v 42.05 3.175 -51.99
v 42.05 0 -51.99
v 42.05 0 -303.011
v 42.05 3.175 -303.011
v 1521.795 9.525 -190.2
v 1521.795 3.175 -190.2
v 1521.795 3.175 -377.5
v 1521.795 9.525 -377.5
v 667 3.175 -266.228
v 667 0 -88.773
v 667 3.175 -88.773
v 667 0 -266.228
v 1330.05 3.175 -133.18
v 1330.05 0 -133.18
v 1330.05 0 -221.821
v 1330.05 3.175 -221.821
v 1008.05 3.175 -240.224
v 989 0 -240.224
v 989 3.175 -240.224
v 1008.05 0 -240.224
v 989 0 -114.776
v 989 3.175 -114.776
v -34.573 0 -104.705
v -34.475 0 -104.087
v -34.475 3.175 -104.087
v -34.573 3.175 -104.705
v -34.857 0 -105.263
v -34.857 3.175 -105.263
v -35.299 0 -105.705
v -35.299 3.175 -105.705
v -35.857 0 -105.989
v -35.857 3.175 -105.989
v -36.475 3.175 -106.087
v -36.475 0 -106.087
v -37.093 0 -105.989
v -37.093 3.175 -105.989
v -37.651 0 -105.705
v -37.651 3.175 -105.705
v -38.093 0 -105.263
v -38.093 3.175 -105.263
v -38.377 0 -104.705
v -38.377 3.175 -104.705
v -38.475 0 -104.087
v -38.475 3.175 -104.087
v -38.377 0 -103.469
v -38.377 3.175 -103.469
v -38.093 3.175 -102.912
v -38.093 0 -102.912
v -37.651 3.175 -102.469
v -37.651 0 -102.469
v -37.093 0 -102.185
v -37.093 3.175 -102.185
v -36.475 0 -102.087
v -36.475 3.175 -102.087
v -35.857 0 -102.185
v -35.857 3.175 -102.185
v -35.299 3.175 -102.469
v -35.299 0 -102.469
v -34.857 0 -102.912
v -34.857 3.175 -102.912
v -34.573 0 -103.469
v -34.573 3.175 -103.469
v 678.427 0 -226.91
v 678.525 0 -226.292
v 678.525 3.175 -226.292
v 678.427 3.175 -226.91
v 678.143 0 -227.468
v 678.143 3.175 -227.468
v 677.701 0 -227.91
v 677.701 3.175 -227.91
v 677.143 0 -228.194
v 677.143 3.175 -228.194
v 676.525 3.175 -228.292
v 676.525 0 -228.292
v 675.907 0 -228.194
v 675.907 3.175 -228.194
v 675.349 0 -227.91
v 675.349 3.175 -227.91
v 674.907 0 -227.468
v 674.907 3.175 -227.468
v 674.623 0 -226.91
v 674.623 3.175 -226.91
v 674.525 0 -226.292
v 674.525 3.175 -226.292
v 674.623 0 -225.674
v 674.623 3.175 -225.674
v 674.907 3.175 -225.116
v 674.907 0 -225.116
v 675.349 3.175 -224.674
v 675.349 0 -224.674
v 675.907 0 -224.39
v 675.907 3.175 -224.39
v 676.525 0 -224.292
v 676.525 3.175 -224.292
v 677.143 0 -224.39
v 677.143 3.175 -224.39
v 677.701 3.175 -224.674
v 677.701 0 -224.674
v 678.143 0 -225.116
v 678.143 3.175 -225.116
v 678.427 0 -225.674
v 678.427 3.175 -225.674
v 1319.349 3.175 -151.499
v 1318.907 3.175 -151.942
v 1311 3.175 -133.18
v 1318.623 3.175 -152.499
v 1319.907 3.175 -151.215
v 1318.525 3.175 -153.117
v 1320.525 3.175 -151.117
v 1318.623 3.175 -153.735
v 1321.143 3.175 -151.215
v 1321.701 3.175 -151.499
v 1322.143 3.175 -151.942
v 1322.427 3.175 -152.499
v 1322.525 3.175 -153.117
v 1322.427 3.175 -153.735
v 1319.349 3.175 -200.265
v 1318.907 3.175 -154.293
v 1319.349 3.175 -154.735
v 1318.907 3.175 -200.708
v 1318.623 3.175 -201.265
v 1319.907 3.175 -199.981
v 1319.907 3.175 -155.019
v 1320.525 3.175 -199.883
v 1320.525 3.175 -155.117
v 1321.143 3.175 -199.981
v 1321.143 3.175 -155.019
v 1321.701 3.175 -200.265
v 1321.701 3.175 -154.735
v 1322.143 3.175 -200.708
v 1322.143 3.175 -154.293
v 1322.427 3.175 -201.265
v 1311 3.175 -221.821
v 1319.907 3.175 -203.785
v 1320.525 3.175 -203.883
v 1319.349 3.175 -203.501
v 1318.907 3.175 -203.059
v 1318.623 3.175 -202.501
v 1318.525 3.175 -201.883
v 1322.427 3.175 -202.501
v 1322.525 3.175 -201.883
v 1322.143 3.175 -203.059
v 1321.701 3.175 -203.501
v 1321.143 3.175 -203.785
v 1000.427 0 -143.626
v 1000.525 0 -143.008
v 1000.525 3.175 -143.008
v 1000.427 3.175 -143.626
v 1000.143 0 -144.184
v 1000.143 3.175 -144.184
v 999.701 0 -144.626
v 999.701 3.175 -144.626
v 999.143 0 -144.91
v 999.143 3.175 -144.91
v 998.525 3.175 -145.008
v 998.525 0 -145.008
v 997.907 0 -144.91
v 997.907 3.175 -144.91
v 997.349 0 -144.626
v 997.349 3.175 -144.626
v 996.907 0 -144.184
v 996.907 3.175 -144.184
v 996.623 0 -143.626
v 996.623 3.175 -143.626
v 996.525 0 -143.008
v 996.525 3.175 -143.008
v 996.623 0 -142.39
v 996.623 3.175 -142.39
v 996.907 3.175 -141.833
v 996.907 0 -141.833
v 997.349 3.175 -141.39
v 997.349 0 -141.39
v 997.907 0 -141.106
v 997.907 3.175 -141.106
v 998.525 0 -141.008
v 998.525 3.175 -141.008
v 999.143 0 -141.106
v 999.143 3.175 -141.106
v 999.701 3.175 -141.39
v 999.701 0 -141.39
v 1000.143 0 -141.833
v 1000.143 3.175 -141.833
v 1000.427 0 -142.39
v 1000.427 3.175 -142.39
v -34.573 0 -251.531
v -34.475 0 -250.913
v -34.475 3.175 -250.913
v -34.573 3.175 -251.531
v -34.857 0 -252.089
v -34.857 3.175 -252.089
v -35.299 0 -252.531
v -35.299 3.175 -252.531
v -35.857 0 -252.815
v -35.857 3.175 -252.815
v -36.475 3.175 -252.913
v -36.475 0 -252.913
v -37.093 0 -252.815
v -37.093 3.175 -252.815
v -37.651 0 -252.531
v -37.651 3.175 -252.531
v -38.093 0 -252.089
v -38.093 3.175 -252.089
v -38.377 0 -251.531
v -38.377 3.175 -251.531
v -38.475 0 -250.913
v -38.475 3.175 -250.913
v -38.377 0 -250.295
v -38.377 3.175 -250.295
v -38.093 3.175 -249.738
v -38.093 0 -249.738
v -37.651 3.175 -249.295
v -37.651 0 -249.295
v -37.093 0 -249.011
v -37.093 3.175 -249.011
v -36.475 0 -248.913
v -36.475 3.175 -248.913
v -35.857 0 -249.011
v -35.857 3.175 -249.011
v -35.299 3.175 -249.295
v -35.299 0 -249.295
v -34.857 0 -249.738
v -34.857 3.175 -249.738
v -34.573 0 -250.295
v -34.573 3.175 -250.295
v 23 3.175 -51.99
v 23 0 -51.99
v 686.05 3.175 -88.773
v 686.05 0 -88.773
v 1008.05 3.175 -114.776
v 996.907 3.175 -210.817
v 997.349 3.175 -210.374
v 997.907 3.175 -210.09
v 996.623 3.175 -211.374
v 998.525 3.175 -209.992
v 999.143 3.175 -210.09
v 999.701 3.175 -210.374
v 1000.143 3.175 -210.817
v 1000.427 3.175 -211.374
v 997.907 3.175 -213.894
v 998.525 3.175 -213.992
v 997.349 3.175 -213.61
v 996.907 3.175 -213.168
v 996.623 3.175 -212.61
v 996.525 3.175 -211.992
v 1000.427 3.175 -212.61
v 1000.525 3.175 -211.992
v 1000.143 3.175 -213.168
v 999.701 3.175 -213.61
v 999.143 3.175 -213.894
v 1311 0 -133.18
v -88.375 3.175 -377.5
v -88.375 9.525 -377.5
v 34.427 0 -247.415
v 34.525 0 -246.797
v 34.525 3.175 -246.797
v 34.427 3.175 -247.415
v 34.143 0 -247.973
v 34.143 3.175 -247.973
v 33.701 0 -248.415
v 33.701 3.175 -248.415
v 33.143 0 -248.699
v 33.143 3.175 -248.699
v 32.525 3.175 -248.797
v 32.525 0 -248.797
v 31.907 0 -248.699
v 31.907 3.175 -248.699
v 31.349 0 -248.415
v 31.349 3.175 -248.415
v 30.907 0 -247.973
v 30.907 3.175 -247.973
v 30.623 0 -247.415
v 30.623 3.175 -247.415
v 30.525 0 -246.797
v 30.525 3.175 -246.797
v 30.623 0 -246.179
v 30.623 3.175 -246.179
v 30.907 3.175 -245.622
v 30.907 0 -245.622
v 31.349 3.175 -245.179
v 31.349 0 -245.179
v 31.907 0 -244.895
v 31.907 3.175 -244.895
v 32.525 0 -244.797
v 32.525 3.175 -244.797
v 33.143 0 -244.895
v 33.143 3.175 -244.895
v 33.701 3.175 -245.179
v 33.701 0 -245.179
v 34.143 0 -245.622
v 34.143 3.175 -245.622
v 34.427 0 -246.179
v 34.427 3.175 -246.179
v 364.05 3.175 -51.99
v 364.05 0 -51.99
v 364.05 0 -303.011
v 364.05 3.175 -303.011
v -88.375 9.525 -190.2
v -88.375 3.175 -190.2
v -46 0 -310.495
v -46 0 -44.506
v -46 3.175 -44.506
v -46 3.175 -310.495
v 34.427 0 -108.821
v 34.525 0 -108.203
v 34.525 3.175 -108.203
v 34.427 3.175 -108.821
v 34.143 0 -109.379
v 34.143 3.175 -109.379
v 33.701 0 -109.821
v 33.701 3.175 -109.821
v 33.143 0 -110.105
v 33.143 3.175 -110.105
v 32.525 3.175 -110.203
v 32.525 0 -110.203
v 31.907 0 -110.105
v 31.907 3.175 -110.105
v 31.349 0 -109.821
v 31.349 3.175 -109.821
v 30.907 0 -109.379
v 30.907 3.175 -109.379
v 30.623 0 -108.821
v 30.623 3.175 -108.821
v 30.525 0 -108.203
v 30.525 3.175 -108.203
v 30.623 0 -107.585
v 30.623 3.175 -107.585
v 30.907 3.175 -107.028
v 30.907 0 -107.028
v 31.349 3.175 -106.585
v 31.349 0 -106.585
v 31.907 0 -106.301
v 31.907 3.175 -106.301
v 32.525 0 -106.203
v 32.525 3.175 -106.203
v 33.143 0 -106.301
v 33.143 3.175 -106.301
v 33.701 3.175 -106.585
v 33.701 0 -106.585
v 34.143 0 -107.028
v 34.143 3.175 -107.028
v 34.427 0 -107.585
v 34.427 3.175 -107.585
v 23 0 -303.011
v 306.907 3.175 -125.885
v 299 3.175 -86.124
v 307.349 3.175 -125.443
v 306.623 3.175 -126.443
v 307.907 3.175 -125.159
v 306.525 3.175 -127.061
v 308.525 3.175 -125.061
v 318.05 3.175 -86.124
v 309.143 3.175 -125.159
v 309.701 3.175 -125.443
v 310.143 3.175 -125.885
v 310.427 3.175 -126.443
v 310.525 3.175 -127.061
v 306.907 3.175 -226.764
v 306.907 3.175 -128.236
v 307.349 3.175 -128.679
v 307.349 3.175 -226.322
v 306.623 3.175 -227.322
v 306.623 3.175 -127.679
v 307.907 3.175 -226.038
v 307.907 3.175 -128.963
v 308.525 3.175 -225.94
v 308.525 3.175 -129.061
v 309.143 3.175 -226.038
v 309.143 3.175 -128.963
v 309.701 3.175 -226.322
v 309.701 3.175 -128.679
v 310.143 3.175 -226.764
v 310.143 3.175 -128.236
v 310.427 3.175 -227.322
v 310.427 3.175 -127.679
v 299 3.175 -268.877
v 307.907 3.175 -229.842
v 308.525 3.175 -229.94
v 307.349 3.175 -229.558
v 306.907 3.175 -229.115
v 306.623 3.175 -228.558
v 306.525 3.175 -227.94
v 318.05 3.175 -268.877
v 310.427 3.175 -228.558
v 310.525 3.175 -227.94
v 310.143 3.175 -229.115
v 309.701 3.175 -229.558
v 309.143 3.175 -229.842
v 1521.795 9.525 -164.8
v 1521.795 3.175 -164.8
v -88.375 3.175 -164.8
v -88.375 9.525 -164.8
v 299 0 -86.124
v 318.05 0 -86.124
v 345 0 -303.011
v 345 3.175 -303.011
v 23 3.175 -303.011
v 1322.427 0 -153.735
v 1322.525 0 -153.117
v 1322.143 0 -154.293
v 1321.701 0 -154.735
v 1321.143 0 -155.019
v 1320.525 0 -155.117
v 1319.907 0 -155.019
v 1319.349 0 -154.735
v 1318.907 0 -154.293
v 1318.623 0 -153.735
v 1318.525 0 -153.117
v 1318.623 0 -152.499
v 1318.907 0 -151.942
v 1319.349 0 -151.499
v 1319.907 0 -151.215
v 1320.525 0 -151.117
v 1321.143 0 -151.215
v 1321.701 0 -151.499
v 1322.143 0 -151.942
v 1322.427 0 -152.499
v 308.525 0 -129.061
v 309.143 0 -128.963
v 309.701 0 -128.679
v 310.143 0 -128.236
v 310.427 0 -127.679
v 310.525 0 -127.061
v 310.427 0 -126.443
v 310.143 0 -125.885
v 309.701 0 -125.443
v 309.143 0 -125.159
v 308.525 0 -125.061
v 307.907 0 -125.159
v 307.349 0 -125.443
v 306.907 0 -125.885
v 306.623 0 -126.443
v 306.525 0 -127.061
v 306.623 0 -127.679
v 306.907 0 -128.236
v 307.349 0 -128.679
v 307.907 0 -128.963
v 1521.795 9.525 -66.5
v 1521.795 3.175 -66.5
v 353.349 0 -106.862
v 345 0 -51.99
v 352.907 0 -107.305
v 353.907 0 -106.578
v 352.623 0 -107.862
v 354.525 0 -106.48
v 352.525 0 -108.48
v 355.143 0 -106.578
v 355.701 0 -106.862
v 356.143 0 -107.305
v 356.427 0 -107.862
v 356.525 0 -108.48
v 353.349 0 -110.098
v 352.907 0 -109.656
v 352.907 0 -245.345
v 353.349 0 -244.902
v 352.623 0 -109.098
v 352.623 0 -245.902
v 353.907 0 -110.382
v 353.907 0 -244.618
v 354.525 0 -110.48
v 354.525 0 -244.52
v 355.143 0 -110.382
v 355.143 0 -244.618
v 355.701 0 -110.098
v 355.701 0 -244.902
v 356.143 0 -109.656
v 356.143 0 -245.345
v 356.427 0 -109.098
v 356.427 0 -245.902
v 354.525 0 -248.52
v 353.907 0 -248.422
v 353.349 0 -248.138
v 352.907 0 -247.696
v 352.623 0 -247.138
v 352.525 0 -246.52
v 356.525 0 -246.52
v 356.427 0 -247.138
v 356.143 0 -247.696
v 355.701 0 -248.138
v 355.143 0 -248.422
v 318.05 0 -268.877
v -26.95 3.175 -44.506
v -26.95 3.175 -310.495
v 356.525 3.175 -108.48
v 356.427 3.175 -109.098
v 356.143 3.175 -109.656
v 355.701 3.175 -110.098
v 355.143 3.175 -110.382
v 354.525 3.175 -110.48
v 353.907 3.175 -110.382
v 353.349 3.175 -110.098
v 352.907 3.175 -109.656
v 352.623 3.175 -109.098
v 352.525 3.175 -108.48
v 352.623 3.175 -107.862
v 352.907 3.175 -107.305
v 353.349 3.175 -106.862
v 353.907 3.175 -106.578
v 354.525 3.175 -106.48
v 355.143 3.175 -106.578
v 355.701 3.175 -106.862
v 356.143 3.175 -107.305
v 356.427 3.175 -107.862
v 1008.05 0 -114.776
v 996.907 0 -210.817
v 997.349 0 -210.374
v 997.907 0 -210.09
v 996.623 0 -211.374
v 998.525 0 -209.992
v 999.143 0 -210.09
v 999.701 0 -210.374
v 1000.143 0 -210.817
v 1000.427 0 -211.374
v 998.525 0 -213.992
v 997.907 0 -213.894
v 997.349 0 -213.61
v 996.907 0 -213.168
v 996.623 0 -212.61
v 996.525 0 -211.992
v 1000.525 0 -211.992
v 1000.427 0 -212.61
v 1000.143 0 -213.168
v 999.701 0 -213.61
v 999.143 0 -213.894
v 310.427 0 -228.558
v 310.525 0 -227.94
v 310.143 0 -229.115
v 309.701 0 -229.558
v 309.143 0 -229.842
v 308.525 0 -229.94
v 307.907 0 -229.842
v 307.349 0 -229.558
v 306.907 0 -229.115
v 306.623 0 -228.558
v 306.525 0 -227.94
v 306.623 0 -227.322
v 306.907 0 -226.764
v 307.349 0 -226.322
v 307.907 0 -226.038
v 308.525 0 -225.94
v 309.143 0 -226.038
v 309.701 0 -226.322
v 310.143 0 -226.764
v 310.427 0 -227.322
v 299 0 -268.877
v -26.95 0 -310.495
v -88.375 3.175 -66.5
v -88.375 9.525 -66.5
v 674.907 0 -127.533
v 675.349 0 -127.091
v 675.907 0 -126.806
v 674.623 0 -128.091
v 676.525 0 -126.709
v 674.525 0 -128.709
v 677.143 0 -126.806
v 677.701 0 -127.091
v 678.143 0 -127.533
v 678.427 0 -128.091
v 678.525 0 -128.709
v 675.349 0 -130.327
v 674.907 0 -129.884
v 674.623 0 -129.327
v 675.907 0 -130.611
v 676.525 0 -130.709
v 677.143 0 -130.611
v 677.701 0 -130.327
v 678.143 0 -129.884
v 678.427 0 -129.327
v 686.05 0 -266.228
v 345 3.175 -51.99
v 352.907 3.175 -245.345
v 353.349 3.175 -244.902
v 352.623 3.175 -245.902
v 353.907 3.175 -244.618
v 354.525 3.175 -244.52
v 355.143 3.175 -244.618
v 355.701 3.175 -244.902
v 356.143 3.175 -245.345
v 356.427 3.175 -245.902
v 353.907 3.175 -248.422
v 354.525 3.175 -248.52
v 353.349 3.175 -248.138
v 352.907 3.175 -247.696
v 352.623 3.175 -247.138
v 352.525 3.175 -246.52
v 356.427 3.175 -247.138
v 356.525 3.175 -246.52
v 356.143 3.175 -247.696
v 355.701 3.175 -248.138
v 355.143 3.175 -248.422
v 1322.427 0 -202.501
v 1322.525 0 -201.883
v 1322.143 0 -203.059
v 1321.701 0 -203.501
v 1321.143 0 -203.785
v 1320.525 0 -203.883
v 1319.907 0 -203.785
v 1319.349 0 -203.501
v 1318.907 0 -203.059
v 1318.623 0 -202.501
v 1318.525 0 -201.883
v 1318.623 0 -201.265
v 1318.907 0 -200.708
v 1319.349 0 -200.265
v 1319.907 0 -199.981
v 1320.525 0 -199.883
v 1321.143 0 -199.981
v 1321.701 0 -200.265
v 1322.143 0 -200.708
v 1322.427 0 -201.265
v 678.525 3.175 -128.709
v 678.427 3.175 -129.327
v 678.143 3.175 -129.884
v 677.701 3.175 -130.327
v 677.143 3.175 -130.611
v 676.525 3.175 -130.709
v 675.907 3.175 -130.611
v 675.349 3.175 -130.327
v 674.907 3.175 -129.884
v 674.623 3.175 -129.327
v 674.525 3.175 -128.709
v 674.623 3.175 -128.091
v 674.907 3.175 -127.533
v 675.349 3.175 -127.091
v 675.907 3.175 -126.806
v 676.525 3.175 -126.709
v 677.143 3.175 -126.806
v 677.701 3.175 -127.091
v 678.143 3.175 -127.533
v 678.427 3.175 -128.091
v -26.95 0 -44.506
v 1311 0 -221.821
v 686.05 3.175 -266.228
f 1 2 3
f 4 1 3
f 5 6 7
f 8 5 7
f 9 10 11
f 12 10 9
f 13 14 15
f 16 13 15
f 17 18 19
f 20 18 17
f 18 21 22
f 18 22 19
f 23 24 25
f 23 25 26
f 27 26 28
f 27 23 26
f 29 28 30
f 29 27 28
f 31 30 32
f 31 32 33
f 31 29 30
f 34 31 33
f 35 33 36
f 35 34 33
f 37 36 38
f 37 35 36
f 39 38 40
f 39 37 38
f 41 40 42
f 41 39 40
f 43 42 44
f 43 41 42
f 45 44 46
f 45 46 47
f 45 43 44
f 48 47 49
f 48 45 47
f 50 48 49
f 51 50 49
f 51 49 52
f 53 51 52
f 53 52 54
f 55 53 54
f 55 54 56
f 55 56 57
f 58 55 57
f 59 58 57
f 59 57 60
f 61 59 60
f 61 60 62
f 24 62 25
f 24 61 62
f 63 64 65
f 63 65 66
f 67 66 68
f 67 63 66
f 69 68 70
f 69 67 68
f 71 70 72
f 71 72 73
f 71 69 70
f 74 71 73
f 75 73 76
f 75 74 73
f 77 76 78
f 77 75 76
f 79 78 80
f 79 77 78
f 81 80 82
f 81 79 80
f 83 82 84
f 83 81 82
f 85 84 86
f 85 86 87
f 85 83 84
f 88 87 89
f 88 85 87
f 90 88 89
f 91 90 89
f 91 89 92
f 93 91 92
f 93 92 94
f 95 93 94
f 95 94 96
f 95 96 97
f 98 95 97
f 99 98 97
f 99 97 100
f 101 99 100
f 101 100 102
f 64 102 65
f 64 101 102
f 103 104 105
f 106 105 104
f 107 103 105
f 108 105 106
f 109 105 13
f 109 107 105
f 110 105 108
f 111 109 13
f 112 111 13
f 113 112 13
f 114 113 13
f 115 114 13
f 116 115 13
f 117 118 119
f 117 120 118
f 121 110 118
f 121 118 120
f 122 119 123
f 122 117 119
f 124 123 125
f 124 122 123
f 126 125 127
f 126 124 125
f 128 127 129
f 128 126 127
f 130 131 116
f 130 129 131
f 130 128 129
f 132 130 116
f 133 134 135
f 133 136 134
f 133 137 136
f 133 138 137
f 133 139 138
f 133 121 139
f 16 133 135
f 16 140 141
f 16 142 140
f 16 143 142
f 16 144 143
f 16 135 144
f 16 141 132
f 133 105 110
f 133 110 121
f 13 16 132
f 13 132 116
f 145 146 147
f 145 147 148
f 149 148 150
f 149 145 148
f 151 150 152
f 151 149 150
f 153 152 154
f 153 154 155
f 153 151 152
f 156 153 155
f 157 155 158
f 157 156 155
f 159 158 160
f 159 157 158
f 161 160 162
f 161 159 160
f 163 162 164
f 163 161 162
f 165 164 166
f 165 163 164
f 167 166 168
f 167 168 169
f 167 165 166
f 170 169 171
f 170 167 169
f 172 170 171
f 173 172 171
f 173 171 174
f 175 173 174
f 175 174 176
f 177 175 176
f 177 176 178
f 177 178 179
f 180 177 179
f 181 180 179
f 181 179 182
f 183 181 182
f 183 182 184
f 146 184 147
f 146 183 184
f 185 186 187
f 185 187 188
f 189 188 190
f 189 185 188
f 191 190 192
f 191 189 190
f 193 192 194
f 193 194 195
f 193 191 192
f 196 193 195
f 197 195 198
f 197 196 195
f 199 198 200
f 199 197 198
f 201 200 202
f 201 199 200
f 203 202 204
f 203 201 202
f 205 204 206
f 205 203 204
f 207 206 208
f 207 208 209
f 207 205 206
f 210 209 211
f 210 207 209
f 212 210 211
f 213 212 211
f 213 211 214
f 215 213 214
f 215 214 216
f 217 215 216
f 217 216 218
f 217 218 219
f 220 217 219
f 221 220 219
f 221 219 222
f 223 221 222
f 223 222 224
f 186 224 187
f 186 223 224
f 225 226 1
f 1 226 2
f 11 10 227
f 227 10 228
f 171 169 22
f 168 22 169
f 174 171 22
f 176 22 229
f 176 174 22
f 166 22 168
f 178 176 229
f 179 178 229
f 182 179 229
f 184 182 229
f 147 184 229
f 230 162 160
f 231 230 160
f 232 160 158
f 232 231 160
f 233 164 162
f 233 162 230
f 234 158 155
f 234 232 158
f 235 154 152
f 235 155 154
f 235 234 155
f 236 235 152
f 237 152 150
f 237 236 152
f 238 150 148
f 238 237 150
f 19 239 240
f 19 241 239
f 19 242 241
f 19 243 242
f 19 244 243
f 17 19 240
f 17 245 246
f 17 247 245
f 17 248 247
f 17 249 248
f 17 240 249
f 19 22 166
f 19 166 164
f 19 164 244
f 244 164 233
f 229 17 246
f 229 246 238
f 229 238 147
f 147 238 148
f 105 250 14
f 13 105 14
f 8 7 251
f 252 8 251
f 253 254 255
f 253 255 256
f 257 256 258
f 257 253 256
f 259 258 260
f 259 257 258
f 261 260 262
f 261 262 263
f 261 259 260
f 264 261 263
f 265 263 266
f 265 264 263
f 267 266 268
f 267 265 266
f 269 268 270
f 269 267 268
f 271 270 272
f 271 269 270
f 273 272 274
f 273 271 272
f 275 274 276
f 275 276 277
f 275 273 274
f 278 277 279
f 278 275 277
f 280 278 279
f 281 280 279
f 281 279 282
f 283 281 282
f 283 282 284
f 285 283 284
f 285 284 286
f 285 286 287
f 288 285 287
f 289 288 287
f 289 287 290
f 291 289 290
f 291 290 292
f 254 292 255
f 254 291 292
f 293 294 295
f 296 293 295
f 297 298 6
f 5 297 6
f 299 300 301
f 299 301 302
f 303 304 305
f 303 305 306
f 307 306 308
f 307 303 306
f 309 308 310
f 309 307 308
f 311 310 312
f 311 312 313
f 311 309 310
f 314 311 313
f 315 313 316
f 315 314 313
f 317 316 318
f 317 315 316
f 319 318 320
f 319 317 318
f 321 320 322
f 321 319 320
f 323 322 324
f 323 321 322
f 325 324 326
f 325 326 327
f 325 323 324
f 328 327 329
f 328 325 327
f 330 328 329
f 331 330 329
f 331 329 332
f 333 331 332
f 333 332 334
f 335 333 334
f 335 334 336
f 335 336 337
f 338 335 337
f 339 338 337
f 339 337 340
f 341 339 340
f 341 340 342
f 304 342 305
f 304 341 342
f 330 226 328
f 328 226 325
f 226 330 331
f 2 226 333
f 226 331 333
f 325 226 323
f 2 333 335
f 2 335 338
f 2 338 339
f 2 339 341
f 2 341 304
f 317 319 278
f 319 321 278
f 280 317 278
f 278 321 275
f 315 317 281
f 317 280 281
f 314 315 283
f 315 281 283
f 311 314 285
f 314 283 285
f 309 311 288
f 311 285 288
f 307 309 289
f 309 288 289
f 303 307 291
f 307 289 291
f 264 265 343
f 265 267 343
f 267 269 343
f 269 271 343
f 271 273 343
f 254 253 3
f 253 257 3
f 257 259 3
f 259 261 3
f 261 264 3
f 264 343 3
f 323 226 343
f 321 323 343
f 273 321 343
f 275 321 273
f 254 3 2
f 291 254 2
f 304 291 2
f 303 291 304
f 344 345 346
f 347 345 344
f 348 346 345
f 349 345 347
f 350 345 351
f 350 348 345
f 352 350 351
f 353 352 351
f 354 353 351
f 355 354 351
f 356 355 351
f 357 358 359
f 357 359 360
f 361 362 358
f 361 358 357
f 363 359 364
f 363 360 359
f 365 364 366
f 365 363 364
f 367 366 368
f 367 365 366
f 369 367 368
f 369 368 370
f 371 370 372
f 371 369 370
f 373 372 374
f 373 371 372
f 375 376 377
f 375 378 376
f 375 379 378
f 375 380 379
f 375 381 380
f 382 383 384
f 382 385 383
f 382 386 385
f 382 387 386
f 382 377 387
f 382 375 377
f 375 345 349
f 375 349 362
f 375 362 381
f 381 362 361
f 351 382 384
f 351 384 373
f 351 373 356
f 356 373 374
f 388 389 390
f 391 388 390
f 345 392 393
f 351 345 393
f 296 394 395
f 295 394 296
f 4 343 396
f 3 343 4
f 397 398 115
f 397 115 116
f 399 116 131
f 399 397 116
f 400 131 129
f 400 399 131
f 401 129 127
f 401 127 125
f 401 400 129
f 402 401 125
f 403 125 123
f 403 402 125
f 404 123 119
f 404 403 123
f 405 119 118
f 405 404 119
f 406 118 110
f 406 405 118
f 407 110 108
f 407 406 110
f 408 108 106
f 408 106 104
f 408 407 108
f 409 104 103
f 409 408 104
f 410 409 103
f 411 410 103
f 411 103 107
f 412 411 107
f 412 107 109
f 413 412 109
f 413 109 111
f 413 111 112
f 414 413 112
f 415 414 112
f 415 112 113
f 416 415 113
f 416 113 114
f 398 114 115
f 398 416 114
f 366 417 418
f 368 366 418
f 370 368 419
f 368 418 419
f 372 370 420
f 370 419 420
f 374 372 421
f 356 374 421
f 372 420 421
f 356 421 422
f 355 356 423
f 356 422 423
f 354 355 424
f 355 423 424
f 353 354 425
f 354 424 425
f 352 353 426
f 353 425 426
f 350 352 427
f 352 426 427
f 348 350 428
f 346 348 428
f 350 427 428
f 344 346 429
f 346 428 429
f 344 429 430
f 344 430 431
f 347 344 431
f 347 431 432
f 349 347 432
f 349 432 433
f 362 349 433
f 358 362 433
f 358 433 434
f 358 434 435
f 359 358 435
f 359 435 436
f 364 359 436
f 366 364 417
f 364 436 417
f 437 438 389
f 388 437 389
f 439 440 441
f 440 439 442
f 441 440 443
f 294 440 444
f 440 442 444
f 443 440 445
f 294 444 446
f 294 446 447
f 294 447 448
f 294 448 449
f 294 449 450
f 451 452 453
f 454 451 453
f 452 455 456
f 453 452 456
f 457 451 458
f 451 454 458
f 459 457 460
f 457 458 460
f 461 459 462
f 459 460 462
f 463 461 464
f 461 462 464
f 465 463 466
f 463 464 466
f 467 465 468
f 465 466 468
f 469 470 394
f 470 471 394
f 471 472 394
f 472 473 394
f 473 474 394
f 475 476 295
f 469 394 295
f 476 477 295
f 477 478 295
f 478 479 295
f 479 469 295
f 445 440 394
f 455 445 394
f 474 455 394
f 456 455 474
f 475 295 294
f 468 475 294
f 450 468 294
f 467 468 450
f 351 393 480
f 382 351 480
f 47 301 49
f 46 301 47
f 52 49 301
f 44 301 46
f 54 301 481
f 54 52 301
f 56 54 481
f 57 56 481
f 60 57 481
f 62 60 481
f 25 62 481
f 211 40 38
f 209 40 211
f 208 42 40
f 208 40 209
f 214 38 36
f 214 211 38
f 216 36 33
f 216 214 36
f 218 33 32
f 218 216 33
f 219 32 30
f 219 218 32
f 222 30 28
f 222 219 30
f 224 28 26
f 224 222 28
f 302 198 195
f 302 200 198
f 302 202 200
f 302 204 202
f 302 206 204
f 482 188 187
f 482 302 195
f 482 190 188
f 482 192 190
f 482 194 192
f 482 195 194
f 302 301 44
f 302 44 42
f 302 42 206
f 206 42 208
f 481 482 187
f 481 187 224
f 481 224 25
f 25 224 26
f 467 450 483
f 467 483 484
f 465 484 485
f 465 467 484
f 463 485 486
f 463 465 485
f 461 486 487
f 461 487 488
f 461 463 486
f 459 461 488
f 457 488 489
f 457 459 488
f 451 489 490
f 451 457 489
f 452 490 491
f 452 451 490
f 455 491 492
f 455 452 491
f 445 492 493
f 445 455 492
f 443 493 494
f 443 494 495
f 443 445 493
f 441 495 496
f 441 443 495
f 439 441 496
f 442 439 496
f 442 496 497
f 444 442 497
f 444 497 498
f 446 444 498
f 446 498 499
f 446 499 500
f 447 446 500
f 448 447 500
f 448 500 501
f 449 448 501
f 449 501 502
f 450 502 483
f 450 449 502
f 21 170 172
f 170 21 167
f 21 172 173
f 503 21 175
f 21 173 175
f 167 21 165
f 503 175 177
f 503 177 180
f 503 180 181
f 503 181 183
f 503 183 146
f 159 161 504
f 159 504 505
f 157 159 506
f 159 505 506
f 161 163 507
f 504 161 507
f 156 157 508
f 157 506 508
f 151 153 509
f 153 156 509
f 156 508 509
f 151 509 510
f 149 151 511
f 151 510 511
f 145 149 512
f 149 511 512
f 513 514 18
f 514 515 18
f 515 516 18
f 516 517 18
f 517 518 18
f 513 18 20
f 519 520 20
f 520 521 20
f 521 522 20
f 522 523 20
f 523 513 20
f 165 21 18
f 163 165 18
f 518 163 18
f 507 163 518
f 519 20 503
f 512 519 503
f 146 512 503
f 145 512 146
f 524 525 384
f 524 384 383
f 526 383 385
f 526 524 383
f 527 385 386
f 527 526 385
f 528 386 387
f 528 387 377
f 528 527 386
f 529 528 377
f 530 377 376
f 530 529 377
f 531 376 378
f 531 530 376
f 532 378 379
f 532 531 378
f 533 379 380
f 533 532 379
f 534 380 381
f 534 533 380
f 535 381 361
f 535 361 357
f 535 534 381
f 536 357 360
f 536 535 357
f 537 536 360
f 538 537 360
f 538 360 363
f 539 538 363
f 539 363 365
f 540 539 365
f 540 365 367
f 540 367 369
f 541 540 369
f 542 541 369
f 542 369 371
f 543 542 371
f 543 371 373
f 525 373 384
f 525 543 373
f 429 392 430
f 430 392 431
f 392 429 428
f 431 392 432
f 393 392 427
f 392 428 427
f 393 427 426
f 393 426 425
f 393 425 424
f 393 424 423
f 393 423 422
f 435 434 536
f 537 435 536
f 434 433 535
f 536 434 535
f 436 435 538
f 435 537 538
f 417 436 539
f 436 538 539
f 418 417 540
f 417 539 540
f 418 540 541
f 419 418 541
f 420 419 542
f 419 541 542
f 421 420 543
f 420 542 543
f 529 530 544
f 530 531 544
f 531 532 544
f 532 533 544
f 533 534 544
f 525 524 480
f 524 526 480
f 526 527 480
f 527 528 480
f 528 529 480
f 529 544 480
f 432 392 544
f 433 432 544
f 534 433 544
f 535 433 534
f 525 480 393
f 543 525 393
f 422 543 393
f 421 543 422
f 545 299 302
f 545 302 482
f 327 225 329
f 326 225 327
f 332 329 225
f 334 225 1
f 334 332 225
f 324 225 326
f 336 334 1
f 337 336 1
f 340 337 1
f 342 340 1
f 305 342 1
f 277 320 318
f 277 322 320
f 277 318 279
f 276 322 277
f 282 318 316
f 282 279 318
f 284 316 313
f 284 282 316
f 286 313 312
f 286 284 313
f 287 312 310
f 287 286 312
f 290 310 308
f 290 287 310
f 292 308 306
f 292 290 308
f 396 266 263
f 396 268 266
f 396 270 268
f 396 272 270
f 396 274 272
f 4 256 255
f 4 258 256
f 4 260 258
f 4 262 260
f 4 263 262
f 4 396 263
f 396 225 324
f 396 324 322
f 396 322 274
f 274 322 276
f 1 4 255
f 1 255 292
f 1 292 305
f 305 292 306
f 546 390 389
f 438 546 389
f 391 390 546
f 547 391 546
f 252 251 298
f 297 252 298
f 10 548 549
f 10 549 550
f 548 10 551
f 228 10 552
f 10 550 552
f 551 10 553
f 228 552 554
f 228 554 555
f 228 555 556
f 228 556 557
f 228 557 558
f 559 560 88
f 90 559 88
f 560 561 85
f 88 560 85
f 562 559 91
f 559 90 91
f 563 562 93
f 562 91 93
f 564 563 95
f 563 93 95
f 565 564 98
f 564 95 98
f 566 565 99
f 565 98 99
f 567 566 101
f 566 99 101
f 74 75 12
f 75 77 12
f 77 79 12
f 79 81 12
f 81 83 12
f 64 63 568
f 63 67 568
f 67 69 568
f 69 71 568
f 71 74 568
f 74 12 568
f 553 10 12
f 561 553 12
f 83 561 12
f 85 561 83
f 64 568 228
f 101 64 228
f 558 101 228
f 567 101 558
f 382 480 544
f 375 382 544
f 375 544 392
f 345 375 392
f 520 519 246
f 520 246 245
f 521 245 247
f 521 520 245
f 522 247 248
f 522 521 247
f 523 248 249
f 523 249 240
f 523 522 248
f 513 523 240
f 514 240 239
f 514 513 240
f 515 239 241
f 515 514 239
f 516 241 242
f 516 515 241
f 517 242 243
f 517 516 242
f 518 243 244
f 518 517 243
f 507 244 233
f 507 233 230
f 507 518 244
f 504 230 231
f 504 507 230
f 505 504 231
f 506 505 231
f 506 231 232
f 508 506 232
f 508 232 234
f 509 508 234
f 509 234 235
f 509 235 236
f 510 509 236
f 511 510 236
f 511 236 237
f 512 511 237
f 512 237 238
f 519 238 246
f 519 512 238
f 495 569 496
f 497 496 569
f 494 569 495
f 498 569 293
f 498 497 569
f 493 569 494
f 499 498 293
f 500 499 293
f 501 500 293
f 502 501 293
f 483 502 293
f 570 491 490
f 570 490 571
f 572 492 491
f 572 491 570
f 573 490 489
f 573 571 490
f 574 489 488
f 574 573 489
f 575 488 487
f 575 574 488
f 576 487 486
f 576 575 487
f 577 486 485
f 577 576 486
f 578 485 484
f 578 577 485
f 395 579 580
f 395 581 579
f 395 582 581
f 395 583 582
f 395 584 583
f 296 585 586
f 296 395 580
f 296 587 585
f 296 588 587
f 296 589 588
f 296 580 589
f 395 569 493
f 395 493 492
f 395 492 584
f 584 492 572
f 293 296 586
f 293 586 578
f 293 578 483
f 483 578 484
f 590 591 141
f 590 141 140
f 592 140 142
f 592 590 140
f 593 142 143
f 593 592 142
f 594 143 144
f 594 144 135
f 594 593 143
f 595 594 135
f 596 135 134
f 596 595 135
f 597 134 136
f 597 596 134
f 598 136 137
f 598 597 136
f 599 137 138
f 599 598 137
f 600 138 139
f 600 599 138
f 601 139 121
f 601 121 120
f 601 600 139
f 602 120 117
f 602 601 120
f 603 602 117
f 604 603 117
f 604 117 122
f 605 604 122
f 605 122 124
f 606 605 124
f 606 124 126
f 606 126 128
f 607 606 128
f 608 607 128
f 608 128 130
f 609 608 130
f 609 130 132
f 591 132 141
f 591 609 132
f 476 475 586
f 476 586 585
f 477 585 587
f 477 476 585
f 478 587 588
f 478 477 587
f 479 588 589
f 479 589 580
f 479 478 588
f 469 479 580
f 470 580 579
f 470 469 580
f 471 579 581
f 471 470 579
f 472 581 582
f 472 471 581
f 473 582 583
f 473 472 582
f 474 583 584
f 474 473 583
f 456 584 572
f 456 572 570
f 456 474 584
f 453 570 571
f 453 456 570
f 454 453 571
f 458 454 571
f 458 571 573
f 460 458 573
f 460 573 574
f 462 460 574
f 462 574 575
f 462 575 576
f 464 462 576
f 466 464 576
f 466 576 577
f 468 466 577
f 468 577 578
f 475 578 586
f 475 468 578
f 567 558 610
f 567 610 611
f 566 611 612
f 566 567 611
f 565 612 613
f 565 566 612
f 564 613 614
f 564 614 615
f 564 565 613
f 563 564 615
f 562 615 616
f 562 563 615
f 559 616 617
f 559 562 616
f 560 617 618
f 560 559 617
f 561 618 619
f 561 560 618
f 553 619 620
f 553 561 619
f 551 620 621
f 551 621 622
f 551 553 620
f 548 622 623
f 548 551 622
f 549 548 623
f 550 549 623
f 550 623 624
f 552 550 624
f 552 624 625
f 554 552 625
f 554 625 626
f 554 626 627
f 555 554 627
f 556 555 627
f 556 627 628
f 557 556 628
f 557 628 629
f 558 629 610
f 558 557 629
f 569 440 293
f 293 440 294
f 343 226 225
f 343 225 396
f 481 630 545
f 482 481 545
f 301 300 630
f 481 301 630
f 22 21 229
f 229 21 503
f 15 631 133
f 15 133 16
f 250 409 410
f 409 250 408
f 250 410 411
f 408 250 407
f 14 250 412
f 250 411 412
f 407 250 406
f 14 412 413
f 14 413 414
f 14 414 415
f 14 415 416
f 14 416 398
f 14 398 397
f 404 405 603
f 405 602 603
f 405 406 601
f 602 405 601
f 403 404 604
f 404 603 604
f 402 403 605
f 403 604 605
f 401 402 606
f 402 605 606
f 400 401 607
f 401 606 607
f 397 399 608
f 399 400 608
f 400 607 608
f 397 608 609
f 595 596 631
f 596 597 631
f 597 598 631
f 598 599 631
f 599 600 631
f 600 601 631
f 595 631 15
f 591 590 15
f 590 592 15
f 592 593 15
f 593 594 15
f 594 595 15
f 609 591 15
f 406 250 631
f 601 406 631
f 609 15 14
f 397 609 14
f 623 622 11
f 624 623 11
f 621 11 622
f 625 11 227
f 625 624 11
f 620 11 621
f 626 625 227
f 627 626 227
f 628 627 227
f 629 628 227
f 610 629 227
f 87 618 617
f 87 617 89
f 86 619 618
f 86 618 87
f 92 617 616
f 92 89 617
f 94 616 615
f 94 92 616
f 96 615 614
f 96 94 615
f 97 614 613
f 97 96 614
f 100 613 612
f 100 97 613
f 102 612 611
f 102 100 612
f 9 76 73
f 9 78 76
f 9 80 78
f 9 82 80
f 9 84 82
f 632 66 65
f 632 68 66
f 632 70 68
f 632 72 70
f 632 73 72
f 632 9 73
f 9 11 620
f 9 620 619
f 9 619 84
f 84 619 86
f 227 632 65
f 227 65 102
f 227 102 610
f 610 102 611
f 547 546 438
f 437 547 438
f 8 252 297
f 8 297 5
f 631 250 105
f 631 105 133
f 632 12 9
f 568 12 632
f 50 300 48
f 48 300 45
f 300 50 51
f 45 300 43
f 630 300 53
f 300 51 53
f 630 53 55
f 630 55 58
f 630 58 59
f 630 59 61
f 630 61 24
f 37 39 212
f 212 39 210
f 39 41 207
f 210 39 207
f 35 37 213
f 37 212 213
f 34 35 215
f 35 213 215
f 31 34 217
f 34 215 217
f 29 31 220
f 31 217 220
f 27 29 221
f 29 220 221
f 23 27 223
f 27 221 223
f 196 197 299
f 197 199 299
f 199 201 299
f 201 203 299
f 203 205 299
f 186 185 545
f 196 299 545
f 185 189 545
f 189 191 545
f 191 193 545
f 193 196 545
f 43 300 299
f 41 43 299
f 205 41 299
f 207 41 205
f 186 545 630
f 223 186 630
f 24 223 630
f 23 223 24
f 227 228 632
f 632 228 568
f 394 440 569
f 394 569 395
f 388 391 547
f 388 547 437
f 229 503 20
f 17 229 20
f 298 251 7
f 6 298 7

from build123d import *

# Parameters (mm, degrees)
SKETCH2_W             = 19.05
SKETCH2_H             = 251.02058
SKETCH2_R             = 2
BOSS_EXTRUDE1_DEPTH   = 3.175
BOSS_EXTRUDE1_2_DEPTH = 3.175
BOSS_EXTRUDE1_3_DEPTH = 3.175
SKETCH2_H_2           = 177.45456
BOSS_EXTRUDE1_4_DEPTH = 3.175
SKETCH2_H_3           = 125.44806
BOSS_EXTRUDE1_5_DEPTH = 3.175
SKETCH2_H_4           = 88.64092
BOSS_EXTRUDE1_6_DEPTH = 3.175
SKETCH2_H_5           = 265.9888
BOSS_EXTRUDE1_7_DEPTH = 3.175
BOSS_EXTRUDE2_DEPTH   = 6.35
BOSS_EXTRUDE2_2_DEPTH = 6.35


with BuildPart() as part:
    # Sketch2 → Boss-Extrude1 (new body)
    with BuildSketch(Plane(origin=(0, 0, 0), x_dir=(1, 0, 0), z_dir=(0, 1, 0))):
        with Locations((32.525, 177.50028)):
            Rectangle(SKETCH2_W, SKETCH2_H)
        with Locations((32.525, 246.79737)):
            Circle(SKETCH2_R, mode=Mode.SUBTRACT)
        with Locations((32.525, 108.20319)):
            Circle(SKETCH2_R, mode=Mode.SUBTRACT)
    extrude(amount=BOSS_EXTRUDE1_DEPTH)


with BuildPart() as body_2:
    # Sketch2 → Boss-Extrude1 2 (new body)
    with BuildSketch(Plane(origin=(0, 0, 0), x_dir=(1, 0, 0), z_dir=(0, 1, 0))):
        Polygon((299, 268.87678), (299, 86.12378), (318.05, 86.12378), (318.05, 268.87678), (308.525, 268.87678), align=None)
        with Locations((308.525, 227.93978)):
            Circle(SKETCH2_R, mode=Mode.SUBTRACT)
        with BuildLine():
            ThreePointArc((308.525, 125.06078), (306.525, 127.06078), (308.525, 129.06078))
            ThreePointArc((308.525, 129.06078), (310.525, 127.06078), (308.525, 125.06078))
        make_face(mode=Mode.SUBTRACT)
    extrude(amount=BOSS_EXTRUDE1_2_DEPTH)


with BuildPart() as body_3:
    # Sketch2 → Boss-Extrude1 3 (new body)
    with BuildSketch(Plane(origin=(0, 0, 0), x_dir=(1, 0, 0), z_dir=(0, 1, 0))):
        with Locations((354.525, 177.50028)):
            Rectangle(SKETCH2_W, SKETCH2_H)
        with Locations((354.525, 108.48022915)):
            Circle(SKETCH2_R, mode=Mode.SUBTRACT)
        with Locations((354.525, 246.52033085)):
            Circle(SKETCH2_R, mode=Mode.SUBTRACT)
    extrude(amount=BOSS_EXTRUDE1_3_DEPTH)


with BuildPart() as body_4:
    # Sketch2 → Boss-Extrude1 4 (new body)
    with BuildSketch(Plane(origin=(0, 0, 0), x_dir=(1, 0, 0), z_dir=(0, 1, 0))):
        with Locations((676.525, 177.50028)):
            Rectangle(SKETCH2_W, SKETCH2_H_2)
        with Locations((676.525, 128.708539125)):
            Circle(SKETCH2_R, mode=Mode.SUBTRACT)
        with Locations((676.525, 226.292020875)):
            Circle(SKETCH2_R, mode=Mode.SUBTRACT)
    extrude(amount=BOSS_EXTRUDE1_4_DEPTH)


with BuildPart() as body_5:
    # Sketch2 → Boss-Extrude1 5 (new body)
    with BuildSketch(Plane(origin=(0, 0, 0), x_dir=(1, 0, 0), z_dir=(0, 1, 0))):
        with Locations((998.525, 177.50028)):
            Rectangle(SKETCH2_W, SKETCH2_H_3)
        with Locations((998.525, 143.008361365)):
            Circle(SKETCH2_R, mode=Mode.SUBTRACT)
        with Locations((998.525, 211.992198635)):
            Circle(SKETCH2_R, mode=Mode.SUBTRACT)
    extrude(amount=BOSS_EXTRUDE1_5_DEPTH)


with BuildPart() as body_6:
    # Sketch2 → Boss-Extrude1 6 (new body)
    with BuildSketch(Plane(origin=(0, 0, 0), x_dir=(1, 0, 0), z_dir=(0, 1, 0))):
        with Locations((1320.525, 177.50028)):
            Rectangle(SKETCH2_W, SKETCH2_H_4)
        with Locations((1320.525, 153.11720963)):
            Circle(SKETCH2_R, mode=Mode.SUBTRACT)
        with Locations((1320.525, 201.88335037)):
            Circle(SKETCH2_R, mode=Mode.SUBTRACT)
    extrude(amount=BOSS_EXTRUDE1_6_DEPTH)


with BuildPart() as body_7:
    # Sketch2 → Boss-Extrude1 7 (new body)
    with BuildSketch(Plane(origin=(0, 0, 0), x_dir=(1, 0, 0), z_dir=(0, 1, 0))):
        with Locations((-36.475, 177.50028)):
            Rectangle(SKETCH2_W, SKETCH2_H_5)
        with Locations((-36.475, 250.91318)):
            Circle(SKETCH2_R, mode=Mode.SUBTRACT)
        with Locations((-36.475, 104.08738)):
            Circle(SKETCH2_R, mode=Mode.SUBTRACT)
    extrude(amount=BOSS_EXTRUDE1_7_DEPTH)


with BuildPart() as body_8:
    # Sketch3 → Boss-Extrude2 (new body)
    with BuildSketch(Plane(origin=(0, 3.175, 0), x_dir=(1, 0, 0), z_dir=(0, 1, 0))):
        Polygon((1311, 190.20028), (1330.05, 190.20028), (1521.795, 190.20028), (1521.795, 377.50028), (-88.375, 377.50028), (-88.375, 190.20028), (-46, 190.20028), (-26.95, 190.20028), align=None)
    extrude(amount=BOSS_EXTRUDE2_DEPTH)


with BuildPart() as body_9:
    # Sketch3 → Boss-Extrude2 2 (new body)
    with BuildSketch(Plane(origin=(0, 3.175, 0), x_dir=(1, 0, 0), z_dir=(0, 1, 0))):
        Polygon((1521.795, 164.80028), (1330.05, 164.80028), (1311, 164.80028), (-88.375, 164.80028), (-88.375, 66.50028), (1521.795, 66.50028), align=None)
    extrude(amount=BOSS_EXTRUDE2_2_DEPTH)


solid = Compound([part.part, body_2.part, body_3.part, body_4.part, body_5.part, body_6.part, body_7.part, body_8.part, body_9.part])
